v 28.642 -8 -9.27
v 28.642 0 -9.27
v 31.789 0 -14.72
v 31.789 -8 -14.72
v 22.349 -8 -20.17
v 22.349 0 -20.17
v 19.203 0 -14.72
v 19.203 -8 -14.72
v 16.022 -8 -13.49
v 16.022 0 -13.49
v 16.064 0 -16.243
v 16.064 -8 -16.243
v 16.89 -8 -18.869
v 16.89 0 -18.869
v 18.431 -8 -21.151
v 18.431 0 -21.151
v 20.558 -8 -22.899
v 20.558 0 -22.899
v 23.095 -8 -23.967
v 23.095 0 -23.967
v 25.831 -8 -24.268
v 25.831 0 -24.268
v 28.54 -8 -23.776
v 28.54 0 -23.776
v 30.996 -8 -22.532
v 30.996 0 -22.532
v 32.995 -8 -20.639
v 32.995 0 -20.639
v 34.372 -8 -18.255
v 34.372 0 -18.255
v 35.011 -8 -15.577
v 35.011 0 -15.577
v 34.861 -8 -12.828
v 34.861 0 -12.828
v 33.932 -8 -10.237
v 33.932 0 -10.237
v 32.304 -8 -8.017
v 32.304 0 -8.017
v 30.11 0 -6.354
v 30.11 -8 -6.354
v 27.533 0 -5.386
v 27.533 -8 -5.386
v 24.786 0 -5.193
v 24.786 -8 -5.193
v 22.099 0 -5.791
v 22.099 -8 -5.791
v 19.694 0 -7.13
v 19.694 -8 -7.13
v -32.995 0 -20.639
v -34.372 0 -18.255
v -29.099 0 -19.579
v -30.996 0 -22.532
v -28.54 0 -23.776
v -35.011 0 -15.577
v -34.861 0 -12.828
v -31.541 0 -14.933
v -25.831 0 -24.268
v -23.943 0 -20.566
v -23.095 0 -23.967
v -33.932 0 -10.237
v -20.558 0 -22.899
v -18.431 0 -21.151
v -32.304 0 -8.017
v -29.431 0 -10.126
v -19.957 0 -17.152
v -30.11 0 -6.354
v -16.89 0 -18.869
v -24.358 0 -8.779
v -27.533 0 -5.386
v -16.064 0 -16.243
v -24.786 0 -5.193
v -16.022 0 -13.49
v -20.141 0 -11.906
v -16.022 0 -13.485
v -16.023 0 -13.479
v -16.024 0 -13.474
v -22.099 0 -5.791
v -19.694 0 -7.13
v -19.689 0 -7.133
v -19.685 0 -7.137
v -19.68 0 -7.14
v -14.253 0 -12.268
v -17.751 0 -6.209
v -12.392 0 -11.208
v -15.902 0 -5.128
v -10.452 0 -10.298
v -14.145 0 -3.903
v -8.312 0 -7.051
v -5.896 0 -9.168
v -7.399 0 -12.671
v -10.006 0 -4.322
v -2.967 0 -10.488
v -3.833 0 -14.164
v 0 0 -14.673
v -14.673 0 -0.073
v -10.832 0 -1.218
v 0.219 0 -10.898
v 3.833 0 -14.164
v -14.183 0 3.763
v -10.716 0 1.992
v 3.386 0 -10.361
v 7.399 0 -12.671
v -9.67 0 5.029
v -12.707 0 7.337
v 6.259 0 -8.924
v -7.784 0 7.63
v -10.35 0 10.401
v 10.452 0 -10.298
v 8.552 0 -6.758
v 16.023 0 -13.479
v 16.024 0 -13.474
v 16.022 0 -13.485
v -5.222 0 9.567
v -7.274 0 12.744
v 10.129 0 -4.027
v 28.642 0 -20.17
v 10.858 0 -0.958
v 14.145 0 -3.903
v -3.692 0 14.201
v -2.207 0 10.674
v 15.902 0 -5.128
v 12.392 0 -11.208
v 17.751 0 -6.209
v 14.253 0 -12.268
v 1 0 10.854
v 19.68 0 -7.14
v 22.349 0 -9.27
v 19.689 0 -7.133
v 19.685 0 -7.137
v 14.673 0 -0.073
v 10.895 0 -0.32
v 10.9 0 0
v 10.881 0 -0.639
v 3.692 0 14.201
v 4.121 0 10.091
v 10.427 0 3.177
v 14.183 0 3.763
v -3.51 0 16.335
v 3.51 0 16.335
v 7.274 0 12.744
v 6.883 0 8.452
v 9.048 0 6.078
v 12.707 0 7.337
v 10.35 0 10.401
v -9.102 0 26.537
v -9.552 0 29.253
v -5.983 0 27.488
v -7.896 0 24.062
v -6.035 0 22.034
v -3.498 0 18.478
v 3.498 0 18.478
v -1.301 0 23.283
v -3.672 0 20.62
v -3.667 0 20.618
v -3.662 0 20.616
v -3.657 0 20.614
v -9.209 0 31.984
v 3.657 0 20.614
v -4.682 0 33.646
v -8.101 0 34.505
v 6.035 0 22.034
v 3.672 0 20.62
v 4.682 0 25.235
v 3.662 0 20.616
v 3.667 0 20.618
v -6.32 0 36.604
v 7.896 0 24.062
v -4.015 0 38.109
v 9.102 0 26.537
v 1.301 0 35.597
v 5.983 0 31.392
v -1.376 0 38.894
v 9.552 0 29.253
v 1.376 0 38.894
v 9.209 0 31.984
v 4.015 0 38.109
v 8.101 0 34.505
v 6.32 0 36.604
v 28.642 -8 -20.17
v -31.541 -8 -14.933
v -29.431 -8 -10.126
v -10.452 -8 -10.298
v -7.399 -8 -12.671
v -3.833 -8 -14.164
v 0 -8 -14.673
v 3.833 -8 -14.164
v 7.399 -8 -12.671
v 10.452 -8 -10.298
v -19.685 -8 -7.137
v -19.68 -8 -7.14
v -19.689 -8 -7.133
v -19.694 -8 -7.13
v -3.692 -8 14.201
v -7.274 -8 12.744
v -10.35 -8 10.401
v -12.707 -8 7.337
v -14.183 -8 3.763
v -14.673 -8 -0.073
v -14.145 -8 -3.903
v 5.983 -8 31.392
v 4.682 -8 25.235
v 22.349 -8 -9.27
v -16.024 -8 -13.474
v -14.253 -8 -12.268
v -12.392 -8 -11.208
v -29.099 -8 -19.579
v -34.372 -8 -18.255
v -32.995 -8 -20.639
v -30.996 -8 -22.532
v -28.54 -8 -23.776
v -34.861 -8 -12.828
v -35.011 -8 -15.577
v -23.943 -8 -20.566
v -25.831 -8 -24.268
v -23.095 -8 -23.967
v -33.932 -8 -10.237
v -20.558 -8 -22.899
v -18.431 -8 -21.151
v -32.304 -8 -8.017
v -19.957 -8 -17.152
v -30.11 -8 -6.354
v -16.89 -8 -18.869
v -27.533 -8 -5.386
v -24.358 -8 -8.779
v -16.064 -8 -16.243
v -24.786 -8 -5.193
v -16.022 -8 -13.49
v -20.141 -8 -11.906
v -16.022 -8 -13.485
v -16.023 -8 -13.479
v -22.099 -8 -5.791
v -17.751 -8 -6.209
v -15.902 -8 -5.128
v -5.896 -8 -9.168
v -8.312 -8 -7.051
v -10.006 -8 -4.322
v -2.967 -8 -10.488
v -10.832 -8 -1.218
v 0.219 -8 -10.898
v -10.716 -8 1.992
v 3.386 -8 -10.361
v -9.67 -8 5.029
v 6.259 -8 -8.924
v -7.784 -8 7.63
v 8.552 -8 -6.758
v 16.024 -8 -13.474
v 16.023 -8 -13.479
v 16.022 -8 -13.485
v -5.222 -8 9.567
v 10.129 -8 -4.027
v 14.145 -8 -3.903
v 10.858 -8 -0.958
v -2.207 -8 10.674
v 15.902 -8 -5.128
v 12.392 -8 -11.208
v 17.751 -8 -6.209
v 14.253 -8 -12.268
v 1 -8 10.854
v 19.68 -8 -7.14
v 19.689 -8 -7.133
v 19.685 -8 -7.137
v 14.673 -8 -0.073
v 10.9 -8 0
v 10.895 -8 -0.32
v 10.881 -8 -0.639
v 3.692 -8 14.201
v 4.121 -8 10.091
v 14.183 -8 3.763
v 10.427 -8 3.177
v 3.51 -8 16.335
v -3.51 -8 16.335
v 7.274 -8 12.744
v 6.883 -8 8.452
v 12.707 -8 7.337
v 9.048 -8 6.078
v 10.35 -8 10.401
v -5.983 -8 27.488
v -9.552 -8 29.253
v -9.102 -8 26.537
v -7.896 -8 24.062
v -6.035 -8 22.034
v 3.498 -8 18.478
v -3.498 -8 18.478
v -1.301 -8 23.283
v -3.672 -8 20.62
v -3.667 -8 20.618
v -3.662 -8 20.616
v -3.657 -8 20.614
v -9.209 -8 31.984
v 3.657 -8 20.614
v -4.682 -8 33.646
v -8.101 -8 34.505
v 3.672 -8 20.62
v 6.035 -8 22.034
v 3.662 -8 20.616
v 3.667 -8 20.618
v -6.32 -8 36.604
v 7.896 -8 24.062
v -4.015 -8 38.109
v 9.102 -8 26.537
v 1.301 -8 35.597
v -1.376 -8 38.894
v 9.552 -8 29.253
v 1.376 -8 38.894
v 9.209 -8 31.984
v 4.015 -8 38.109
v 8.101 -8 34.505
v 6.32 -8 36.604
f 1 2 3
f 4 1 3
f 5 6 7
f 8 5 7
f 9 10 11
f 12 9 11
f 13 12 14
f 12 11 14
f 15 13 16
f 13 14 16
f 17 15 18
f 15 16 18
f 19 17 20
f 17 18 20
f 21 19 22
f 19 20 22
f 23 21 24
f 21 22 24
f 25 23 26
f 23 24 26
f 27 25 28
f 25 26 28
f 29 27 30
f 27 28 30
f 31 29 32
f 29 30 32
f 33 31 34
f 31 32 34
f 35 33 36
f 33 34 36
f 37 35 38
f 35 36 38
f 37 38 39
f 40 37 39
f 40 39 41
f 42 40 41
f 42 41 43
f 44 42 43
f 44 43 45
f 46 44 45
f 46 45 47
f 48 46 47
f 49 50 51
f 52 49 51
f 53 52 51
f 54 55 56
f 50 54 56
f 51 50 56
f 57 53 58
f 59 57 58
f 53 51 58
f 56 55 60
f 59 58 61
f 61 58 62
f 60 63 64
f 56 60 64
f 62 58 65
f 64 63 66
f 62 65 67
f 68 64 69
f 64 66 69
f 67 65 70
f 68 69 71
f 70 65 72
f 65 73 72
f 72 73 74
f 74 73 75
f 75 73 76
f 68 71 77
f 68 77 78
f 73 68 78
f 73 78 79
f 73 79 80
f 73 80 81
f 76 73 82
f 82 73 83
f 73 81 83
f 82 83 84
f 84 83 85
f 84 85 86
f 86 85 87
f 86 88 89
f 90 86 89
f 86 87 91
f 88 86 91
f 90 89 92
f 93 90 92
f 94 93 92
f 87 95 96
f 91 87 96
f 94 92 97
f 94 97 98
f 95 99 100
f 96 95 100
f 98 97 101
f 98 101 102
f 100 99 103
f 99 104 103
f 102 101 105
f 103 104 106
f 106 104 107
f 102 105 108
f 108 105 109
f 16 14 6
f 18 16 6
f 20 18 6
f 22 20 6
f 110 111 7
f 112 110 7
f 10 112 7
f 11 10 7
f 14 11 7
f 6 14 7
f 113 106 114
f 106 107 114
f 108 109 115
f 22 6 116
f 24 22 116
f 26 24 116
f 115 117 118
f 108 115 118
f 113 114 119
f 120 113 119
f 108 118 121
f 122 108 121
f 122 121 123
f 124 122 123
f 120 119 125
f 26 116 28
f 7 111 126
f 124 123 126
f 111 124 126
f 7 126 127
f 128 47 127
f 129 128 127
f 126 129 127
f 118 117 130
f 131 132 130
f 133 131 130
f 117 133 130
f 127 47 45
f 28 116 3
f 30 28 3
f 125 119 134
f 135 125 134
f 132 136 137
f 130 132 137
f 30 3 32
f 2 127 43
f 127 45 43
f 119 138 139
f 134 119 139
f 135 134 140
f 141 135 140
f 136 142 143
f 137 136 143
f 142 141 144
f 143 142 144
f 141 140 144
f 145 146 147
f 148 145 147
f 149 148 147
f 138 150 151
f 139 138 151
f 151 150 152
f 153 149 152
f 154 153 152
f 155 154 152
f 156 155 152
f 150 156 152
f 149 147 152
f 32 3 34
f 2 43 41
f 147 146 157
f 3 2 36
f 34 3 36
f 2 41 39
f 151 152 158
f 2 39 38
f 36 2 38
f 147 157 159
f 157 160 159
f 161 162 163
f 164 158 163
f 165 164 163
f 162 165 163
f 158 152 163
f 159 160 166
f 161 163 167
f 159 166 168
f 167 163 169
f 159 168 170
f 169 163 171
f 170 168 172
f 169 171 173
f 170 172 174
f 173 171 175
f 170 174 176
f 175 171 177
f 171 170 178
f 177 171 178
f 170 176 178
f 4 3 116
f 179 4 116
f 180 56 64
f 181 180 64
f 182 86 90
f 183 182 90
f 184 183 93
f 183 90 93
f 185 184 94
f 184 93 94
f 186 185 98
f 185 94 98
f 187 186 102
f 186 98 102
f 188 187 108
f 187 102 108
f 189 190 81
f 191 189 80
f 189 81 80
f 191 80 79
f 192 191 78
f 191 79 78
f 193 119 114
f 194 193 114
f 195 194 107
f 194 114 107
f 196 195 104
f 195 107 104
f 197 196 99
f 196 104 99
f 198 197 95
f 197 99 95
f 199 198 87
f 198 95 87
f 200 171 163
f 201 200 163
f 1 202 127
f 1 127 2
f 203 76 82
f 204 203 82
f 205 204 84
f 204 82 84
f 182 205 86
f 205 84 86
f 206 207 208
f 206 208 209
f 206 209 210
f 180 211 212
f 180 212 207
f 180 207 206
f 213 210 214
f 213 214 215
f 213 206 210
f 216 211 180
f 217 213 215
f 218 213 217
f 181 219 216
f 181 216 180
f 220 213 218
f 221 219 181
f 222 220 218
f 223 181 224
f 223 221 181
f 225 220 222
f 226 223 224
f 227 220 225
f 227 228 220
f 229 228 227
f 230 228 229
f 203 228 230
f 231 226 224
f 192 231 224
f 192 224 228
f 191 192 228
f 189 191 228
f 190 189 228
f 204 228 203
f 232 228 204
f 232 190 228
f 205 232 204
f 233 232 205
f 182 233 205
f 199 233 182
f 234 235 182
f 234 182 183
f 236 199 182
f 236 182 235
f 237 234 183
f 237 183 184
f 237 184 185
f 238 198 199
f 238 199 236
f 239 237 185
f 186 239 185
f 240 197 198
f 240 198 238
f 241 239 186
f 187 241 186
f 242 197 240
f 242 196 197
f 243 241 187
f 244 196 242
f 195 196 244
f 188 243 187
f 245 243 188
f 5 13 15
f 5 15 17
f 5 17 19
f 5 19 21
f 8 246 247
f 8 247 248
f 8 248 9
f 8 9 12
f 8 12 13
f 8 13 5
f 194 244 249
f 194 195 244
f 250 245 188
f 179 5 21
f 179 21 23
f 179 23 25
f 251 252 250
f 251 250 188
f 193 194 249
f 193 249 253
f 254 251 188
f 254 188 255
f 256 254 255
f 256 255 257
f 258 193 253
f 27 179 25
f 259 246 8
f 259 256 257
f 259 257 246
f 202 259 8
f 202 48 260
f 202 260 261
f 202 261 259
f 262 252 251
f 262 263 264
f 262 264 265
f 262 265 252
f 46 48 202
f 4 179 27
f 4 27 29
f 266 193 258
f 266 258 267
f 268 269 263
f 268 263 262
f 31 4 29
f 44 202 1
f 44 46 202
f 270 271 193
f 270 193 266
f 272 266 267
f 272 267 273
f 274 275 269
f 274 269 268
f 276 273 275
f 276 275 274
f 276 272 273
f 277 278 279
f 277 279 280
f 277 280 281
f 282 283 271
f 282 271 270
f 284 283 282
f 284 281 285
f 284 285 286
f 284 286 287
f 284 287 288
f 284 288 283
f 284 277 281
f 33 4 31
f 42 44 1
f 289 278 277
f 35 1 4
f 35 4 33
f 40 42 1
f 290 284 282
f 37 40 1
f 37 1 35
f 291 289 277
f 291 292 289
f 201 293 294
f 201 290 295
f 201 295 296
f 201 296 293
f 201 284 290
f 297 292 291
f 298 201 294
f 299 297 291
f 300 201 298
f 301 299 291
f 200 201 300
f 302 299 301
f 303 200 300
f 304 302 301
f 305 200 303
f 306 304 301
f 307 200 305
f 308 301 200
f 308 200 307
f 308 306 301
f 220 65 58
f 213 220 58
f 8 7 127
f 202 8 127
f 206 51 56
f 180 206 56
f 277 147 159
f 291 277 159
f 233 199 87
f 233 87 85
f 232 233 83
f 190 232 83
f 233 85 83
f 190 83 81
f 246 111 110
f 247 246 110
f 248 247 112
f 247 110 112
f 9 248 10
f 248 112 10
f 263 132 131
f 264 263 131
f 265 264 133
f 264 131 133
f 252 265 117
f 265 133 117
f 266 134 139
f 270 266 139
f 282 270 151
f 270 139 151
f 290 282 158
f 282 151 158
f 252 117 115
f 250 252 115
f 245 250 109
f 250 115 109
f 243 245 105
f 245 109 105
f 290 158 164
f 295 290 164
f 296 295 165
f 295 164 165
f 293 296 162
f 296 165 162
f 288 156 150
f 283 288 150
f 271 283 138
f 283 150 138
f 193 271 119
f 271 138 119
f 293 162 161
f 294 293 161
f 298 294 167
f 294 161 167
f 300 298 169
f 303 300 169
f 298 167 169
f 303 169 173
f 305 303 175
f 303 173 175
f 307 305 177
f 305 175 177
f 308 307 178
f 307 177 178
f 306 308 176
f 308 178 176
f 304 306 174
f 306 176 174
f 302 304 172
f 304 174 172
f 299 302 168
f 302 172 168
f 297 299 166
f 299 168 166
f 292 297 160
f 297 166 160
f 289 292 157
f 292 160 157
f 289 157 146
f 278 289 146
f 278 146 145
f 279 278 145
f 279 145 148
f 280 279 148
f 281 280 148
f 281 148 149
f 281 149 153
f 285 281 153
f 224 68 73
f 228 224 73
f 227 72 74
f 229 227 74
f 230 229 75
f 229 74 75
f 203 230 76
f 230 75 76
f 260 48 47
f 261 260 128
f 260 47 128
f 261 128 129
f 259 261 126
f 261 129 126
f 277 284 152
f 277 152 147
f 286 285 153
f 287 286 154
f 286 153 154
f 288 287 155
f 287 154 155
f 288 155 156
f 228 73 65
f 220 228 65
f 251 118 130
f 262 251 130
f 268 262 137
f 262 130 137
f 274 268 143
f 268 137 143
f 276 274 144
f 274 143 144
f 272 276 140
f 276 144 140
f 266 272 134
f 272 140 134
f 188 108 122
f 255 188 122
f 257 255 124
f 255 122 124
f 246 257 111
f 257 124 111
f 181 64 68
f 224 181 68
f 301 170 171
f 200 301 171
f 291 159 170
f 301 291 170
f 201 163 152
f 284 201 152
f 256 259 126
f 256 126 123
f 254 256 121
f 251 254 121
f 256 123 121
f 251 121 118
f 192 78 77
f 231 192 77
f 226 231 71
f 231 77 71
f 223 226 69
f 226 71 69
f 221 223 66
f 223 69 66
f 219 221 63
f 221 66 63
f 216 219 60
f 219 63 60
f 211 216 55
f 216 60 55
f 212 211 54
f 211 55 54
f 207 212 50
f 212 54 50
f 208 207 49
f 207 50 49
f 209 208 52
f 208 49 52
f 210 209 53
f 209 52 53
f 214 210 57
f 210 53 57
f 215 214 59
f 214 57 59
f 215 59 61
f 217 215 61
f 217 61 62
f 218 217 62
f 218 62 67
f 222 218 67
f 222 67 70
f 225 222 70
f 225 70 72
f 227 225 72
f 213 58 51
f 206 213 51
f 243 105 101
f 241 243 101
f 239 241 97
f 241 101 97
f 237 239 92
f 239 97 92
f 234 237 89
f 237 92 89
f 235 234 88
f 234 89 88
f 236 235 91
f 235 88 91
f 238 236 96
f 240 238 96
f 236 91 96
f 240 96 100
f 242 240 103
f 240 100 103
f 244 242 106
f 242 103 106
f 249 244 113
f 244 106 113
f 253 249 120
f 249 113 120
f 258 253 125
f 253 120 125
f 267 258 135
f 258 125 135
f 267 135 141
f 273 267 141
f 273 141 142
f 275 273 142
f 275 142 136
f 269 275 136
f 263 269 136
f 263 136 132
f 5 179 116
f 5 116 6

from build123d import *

# Parameters (mm, degrees)
F1_DEPTH = 8


with BuildPart() as f1:
    # F0 (on Front) → F1 (new body)
    with BuildSketch(Plane.XZ):
        with BuildLine():
            ThreePointArc((3.672208, 20.620274), (0, 38.993878), (-3.672208, 20.620274))
            Line((-3.672208, 20.620274), (-3.672208, 20.747529))
            ThreePointArc((-3.672208, 20.747529), (-3.664311, 20.680667), (-3.656581, 20.613784))
            ThreePointArc((-3.656581, 20.613784), (-3.482802, 17.406357), (-3.692215, 14.201059))
            ThreePointArc((-3.692215, 14.201059), (-12.707356, 7.336596), (-14.144586, -3.902978))
            ThreePointArc((-14.144586, -3.902978), (-16.815748, -5.686984), (-19.680351, -7.1402))
            ThreePointArc((-19.680351, -7.1402), (-19.742138, -7.166947), (-19.803991, -7.19354))
            Line((-19.803991, -7.19354), (-19.693785, -7.129912))
            ThreePointArc((-19.693785, -7.129912), (-33.769689, -19.496939), (-16.021578, -13.490362))
            Line((-16.021578, -13.490362), (-16.131784, -13.55399))
            ThreePointArc((-16.131784, -13.55399), (-16.077827, -13.51372), (-16.02377, -13.473584))
            ThreePointArc((-16.02377, -13.473584), (-13.332947, -11.719373), (-10.452371, -10.298081))
            ThreePointArc((-10.452371, -10.298081), (0, -14.673191), (10.452371, -10.298081))
            ThreePointArc((10.452371, -10.298081), (13.332947, -11.719373), (16.02377, -13.473584))
            ThreePointArc((16.02377, -13.473584), (16.077827, -13.51372), (16.131784, -13.55399))
            Line((16.131784, -13.55399), (16.021578, -13.490362))
            ThreePointArc((16.021578, -13.490362), (33.769689, -19.496939), (19.693785, -7.129912))
            Line((19.693785, -7.129912), (19.803991, -7.19354))
            ThreePointArc((19.803991, -7.19354), (19.742138, -7.166947), (19.680351, -7.1402))
            ThreePointArc((19.680351, -7.1402), (16.815748, -5.686984), (14.144586, -3.902978))
            ThreePointArc((14.144586, -3.902978), (12.707356, 7.336596), (3.692215, 14.201059))
            ThreePointArc((3.692215, 14.201059), (3.482802, 17.406357), (3.656581, 20.613784))
            ThreePointArc((3.656581, 20.613784), (3.664311, 20.680667), (3.672208, 20.747529))
            Line((3.672208, 20.747529), (3.672208, 20.620274))
        make_face()
        Polygon((-23.943451, -20.566496), (-29.098889, -19.578989), (-31.541188, -14.932604), (-29.431247, -10.126165), (-24.357895, -8.779017), (-20.141468, -11.90559), (-19.957023, -17.151512), align=None, mode=Mode.SUBTRACT)
        Polygon((31.788998, -14.720053), (28.642439, -20.170053), (22.349321, -20.170053), (19.202762, -14.720053), (22.349321, -9.270053), (28.642439, -9.270053), align=None, mode=Mode.SUBTRACT)
        with BuildLine():
            ThreePointArc((10.9, 0), (10.889444, -0.479582), (10.857798, -0.958236))
            ThreePointArc((10.857798, -0.958236), (9.439677, -5.45), (6.258756, -8.924011))
            ThreePointArc((6.258756, -8.924011), (-9.670327, 5.029392), (10.9, 0))
        make_face(mode=Mode.SUBTRACT)
        Polygon((4.68163, 25.234673), (-1.301197, 23.282979), (-5.982827, 27.488413), (-4.68163, 33.64554), (1.301197, 35.597234), (5.982827, 31.391801), align=None, mode=Mode.SUBTRACT)
        with BuildLine():
            Line((-3.672208, 20.747529), (-3.672208, 20.620274))
            ThreePointArc((-3.672208, 20.620274), (-3.664396, 20.617026), (-3.656581, 20.613784))
            ThreePointArc((-3.656581, 20.613784), (-3.664311, 20.680667), (-3.672208, 20.747529))
        make_face()
        with BuildLine():
            ThreePointArc((3.656581, 20.613784), (3.664396, 20.617026), (3.672208, 20.620274))
            Line((3.672208, 20.620274), (3.672208, 20.747529))
            ThreePointArc((3.672208, 20.747529), (3.664311, 20.680667), (3.656581, 20.613784))
        make_face()
        with BuildLine():
            ThreePointArc((-19.803991, -7.19354), (-19.742138, -7.166947), (-19.680351, -7.1402))
            ThreePointArc((-19.680351, -7.1402), (-19.687066, -7.135053), (-19.693785, -7.129912))
            Line((-19.693785, -7.129912), (-19.803991, -7.19354))
        make_face()
        with BuildLine():
            ThreePointArc((19.693785, -7.129912), (19.687066, -7.135053), (19.680351, -7.1402))
            ThreePointArc((19.680351, -7.1402), (19.742138, -7.166947), (19.803991, -7.19354))
            Line((19.803991, -7.19354), (19.693785, -7.129912))
        make_face()
        with BuildLine():
            Line((-16.131784, -13.55399), (-16.021578, -13.490362))
            ThreePointArc((-16.021578, -13.490362), (-16.02267, -13.481973), (-16.02377, -13.473584))
            ThreePointArc((-16.02377, -13.473584), (-16.077827, -13.51372), (-16.131784, -13.55399))
        make_face()
        with BuildLine():
            ThreePointArc((16.02377, -13.473584), (16.02267, -13.481973), (16.021578, -13.490362))
            Line((16.021578, -13.490362), (16.131784, -13.55399))
            ThreePointArc((16.131784, -13.55399), (16.077827, -13.51372), (16.02377, -13.473584))
        make_face()
    extrude(amount=F1_DEPTH)


solid = f1.part
